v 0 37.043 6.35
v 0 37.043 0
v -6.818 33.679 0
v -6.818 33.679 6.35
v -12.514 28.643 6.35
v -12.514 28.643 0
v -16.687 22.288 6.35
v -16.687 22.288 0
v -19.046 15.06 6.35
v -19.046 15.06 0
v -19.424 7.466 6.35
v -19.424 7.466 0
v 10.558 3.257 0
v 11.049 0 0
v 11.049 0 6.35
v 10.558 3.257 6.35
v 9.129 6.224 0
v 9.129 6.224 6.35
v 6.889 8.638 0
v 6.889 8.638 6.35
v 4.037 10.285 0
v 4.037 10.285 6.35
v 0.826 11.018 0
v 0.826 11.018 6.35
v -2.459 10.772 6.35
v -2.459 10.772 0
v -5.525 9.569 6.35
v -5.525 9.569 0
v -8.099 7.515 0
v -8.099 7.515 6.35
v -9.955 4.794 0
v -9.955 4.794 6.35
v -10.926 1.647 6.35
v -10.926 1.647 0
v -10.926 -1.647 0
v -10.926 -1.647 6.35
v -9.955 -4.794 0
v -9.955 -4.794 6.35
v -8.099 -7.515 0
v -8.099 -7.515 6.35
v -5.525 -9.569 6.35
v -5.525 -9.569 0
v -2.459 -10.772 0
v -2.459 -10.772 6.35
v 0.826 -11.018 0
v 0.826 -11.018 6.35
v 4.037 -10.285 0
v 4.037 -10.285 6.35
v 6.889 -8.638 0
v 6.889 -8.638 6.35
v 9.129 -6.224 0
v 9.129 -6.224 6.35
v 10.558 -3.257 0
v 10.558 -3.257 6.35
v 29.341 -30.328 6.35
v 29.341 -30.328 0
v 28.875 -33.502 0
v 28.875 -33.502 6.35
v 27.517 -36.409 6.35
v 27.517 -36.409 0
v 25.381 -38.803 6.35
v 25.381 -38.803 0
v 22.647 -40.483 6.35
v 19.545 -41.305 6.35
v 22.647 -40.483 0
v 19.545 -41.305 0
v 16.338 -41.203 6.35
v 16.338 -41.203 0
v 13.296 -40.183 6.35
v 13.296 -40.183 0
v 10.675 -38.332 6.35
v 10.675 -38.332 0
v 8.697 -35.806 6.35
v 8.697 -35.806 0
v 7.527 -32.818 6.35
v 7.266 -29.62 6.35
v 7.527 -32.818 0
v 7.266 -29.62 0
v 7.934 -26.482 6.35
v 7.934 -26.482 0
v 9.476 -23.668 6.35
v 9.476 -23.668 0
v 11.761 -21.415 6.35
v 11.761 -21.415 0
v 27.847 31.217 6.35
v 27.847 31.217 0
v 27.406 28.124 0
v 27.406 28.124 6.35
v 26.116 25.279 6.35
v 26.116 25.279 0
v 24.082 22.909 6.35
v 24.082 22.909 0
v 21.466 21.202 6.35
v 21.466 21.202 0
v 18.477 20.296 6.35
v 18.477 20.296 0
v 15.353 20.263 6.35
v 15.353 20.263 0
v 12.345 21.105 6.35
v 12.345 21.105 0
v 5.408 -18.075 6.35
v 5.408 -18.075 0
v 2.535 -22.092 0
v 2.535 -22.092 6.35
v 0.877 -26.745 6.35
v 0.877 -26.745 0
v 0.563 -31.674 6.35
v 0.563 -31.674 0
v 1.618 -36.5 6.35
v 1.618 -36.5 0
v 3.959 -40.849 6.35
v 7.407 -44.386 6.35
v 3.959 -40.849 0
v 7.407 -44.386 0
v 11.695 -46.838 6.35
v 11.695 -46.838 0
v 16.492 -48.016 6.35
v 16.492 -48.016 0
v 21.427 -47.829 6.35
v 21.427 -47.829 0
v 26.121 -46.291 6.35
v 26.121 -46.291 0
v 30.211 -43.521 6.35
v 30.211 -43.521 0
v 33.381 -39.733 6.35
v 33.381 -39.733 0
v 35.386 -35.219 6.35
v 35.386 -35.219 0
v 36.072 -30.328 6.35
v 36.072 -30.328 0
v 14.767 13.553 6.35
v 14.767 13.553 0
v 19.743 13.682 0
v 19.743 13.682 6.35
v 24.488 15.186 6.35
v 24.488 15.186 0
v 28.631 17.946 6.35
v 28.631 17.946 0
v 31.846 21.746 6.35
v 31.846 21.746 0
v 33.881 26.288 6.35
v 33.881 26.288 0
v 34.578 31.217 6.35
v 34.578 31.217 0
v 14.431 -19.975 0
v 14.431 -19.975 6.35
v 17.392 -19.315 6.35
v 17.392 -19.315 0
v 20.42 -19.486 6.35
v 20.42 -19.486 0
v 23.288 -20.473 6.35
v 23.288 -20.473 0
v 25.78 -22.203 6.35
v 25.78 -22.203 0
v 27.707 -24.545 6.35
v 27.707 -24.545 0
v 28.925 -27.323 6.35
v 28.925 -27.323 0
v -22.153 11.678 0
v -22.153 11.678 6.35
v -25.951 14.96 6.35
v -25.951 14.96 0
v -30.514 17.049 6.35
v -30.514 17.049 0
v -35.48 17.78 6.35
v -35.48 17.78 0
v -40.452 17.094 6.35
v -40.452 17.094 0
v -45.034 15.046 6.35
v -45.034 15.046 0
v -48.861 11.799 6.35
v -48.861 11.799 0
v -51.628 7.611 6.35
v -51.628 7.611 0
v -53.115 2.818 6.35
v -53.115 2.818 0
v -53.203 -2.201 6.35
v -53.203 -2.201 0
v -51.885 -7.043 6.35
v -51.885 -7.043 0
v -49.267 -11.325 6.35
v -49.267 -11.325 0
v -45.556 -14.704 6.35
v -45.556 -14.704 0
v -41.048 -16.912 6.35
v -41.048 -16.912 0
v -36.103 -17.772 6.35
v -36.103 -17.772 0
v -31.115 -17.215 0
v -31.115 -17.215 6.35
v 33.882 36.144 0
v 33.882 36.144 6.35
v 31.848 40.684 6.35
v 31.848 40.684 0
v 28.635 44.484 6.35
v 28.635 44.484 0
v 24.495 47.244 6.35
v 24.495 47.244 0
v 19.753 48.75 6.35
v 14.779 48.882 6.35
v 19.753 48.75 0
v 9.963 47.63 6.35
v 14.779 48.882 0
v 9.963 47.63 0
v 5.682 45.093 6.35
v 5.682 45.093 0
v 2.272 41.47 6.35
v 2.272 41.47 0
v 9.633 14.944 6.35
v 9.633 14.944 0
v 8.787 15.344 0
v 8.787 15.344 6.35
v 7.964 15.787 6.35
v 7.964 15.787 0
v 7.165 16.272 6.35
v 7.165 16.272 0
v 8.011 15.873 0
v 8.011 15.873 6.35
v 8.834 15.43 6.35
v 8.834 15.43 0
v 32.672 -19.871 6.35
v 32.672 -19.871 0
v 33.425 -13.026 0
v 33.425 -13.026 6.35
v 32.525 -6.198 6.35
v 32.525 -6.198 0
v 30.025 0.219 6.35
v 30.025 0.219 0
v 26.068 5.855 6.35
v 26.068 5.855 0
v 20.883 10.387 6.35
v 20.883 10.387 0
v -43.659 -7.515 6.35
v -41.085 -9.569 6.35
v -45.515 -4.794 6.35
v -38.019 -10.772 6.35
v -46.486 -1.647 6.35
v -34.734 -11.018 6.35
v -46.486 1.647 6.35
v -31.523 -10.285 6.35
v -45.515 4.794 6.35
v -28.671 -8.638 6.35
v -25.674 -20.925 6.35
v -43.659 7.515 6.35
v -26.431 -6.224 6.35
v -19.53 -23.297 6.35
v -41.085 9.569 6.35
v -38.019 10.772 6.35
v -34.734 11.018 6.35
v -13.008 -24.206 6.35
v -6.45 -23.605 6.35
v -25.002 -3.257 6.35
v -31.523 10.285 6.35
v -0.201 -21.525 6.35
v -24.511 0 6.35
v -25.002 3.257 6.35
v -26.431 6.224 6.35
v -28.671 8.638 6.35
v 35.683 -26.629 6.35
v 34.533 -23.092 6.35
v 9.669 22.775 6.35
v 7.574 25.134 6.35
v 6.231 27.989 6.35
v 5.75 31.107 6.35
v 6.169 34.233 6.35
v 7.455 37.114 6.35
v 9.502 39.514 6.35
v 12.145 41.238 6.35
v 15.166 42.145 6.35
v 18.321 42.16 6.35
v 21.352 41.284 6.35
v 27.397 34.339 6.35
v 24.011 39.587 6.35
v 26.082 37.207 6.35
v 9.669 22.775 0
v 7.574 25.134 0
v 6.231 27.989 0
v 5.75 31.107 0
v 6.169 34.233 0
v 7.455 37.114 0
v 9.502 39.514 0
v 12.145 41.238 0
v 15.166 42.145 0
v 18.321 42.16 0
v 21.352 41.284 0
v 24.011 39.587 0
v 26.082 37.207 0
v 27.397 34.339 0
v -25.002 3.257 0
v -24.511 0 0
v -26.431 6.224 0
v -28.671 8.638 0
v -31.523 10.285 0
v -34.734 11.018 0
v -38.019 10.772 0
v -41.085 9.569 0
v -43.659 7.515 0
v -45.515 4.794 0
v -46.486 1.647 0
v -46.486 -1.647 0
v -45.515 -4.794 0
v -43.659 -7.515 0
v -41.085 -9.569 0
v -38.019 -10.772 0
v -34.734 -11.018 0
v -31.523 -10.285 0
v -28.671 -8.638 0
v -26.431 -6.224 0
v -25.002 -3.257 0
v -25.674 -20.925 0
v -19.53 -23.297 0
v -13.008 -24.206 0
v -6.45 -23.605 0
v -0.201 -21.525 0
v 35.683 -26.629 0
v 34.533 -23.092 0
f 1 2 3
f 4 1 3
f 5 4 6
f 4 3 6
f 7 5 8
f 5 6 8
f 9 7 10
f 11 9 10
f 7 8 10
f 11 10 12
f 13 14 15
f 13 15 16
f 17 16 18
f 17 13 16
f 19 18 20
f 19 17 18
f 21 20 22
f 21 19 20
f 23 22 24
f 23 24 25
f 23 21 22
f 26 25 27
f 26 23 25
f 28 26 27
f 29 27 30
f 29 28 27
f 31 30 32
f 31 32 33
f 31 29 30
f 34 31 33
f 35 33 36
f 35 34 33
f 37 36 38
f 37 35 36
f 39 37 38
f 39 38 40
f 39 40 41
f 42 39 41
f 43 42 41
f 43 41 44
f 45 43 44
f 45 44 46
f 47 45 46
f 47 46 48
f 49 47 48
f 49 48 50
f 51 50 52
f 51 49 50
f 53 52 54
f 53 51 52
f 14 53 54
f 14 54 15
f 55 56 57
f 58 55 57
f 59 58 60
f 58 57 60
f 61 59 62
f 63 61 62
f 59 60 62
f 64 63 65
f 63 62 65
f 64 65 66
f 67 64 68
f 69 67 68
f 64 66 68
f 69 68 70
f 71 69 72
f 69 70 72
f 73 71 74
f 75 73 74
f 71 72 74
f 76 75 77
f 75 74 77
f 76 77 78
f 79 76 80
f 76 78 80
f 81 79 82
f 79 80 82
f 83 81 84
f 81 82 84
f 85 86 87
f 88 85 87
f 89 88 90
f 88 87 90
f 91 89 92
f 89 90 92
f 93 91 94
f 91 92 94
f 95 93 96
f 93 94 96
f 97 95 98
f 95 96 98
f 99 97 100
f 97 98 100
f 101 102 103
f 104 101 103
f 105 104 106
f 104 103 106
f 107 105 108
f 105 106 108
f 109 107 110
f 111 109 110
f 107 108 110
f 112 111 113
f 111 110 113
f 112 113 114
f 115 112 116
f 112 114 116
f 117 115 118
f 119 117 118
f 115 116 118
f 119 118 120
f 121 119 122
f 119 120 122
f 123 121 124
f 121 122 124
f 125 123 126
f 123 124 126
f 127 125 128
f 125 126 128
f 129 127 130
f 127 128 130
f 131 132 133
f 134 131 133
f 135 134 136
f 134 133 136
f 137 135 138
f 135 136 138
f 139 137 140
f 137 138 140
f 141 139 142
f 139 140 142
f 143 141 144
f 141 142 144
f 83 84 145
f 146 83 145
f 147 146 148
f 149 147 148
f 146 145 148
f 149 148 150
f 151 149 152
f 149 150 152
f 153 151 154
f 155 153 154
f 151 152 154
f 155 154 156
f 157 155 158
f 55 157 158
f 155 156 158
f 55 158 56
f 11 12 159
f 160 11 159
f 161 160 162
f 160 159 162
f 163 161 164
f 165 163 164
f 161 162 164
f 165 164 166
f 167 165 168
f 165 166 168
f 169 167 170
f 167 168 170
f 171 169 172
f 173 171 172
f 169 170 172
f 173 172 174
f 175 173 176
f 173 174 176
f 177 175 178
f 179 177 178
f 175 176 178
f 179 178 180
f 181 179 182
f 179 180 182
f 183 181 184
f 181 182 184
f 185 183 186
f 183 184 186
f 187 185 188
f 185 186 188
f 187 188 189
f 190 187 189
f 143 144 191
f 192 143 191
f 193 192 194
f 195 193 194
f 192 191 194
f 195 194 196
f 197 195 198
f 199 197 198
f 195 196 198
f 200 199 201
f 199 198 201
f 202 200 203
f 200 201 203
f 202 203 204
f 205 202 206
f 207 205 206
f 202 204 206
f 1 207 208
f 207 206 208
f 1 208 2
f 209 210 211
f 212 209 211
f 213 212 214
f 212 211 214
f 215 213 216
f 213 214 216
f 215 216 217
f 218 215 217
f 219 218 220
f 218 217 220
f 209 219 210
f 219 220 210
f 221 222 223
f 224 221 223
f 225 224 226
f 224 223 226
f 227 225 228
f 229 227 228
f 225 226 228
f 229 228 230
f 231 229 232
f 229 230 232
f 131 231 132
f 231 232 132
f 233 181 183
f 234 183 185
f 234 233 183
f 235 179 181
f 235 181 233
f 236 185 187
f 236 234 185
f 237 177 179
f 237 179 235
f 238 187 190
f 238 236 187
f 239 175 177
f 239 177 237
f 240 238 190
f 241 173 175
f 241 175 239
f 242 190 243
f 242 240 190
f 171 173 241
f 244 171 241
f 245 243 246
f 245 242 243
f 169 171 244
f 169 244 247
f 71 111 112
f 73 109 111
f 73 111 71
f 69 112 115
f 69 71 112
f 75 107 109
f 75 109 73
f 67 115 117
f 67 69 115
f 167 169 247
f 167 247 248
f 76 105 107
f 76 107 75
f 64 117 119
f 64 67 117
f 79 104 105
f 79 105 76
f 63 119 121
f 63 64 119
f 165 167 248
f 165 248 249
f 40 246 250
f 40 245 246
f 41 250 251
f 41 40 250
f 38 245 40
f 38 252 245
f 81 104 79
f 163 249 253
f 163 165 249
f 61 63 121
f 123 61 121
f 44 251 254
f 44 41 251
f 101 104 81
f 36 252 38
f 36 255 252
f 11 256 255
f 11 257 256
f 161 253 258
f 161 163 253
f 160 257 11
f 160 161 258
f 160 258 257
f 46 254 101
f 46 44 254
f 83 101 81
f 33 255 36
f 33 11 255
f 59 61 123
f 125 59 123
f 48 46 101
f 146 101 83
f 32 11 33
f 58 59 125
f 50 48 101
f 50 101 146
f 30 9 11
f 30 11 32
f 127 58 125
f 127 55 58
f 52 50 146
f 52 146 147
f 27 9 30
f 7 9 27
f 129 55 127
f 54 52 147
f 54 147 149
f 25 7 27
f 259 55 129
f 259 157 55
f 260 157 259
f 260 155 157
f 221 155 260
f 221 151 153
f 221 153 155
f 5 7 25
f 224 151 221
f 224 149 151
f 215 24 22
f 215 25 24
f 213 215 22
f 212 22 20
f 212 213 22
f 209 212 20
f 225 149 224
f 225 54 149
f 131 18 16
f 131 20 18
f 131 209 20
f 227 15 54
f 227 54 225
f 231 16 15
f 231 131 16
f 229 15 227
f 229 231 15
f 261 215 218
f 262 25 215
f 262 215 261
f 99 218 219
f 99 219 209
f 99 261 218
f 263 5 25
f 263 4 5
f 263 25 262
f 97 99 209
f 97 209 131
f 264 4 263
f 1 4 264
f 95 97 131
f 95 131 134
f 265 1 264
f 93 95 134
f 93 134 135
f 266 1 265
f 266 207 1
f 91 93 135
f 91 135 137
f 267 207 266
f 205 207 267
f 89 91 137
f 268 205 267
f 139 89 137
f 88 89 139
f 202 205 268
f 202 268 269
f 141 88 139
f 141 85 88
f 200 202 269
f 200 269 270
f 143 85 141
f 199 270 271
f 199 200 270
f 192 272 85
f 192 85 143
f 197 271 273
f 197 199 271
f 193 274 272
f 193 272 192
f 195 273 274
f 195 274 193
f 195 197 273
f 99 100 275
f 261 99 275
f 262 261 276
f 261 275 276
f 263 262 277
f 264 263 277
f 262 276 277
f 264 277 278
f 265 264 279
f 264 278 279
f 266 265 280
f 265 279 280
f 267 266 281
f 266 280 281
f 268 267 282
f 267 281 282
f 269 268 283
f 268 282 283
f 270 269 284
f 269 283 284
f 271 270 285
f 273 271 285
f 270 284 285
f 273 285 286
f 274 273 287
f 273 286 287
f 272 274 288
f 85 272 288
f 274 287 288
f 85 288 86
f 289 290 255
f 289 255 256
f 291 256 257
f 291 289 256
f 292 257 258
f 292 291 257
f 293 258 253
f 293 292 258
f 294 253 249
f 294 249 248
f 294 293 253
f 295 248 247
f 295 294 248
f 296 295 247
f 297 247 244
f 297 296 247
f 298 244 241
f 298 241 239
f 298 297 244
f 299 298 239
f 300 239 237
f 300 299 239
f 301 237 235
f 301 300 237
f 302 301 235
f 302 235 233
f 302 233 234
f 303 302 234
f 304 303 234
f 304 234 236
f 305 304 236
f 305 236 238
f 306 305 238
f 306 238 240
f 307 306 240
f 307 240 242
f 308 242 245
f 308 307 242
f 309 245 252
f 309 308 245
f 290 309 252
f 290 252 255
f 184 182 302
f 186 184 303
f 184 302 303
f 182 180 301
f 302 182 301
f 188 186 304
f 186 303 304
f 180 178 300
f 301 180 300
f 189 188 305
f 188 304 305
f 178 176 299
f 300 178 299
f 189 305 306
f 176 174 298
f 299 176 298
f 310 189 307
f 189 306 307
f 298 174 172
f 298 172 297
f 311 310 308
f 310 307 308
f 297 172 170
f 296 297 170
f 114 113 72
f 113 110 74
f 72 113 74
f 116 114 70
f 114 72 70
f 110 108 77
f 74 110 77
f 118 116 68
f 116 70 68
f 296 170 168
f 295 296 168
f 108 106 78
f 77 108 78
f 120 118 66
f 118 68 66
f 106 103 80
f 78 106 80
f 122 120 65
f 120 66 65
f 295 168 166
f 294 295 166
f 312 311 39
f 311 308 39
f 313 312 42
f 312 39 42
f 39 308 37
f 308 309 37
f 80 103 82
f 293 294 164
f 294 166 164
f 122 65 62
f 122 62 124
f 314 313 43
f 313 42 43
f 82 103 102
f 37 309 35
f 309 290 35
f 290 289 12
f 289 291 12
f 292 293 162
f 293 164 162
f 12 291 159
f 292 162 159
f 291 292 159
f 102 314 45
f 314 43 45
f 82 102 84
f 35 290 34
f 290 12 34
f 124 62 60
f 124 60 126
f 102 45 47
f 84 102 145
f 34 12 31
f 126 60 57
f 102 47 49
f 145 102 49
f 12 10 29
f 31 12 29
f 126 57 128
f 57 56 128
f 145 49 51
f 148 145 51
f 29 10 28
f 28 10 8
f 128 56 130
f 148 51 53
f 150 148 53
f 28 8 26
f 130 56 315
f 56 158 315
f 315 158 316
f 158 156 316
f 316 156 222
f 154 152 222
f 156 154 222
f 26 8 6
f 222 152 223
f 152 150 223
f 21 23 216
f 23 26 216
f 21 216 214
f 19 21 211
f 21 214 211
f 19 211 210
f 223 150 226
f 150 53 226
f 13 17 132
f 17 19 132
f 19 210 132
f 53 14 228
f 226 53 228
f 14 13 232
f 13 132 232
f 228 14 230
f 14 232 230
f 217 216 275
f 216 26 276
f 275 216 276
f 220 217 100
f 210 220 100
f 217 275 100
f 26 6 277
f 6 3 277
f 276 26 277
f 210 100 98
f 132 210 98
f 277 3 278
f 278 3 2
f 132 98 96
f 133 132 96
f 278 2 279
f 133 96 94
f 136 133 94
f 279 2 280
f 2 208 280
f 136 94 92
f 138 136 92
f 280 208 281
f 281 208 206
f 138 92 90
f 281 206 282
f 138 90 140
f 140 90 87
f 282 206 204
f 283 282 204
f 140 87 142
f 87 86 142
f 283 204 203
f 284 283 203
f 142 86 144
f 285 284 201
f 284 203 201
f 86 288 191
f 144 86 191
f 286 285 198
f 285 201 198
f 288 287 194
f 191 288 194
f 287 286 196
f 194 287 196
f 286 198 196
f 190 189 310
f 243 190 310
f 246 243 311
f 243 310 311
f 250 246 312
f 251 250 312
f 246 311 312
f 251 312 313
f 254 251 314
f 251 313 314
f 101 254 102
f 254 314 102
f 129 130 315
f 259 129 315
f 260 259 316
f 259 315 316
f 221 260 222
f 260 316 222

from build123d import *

# Parameters (mm, degrees)
F0_R     = 11.049
F1_DEPTH = 6.35


with BuildPart() as f1:
    # F0 (on Top) → F1 (new body)
    with BuildSketch(Plane.XY):
        with BuildLine():
            ThreePointArc((10.5094277958, -14.3415594481), (15.8585312405, -8.0396136036), (17.78, 0))
            ThreePointArc((17.78, 0), (15.6108797336, 8.5105131421), (9.6327745846, 14.9444991151))
            ThreePointArc((9.6327745846, 14.9444991151), (8.3729133787, 15.5596772314), (7.1654409141, 16.2722111745))
            ThreePointArc((7.1654409141, 16.2722111745), (-9.7140841192, 14.8917752376), (-17.78, 0))
            ThreePointArc((-17.78, 0), (-9.4273906442, -15.0749031719), (7.7827340428, -15.986164356))
            ThreePointArc((7.7827340428, -15.986164356), (9.1091896886, -15.102697614), (10.5094277958, -14.3415594481))
        make_face()
        Circle(F0_R, mode=Mode.SUBTRACT)
        with BuildLine():
            ThreePointArc((9.6327745846, 14.9444991151), (15.6108797336, 8.5105131421), (17.78, 0))
            ThreePointArc((17.78, 0), (15.8585312405, -8.0396136036), (10.5094277958, -14.3415594481))
            ThreePointArc((10.5094277958, -14.3415594481), (22.5963149024, -13.0765595999), (32.6723306155, -19.8711877644))
            ThreePointArc((32.6723306155, -19.8711877644), (30.024905988, 0.2187336146), (14.766870478, 13.5531308843))
            ThreePointArc((14.766870478, 13.5531308843), (12.1474957403, 14.0557311296), (9.6327745846, 14.9444991151))
        make_face()
        with BuildLine():
            ThreePointArc((14.766870478, 13.5531308843), (12.2321244934, 14.3680080122), (9.6327745846, 14.9444991151))
            ThreePointArc((9.6327745846, 14.9444991151), (12.1474957403, 14.0557311296), (14.766870478, 13.5531308843))
        make_face()
        with BuildLine():
            ThreePointArc((7.1654409141, 16.2722111745), (8.42530212, 15.6570330582), (9.6327745846, 14.9444991151))
            ThreePointArc((9.6327745846, 14.9444991151), (12.2321244934, 14.3680080122), (14.766870478, 13.5531308843))
            ThreePointArc((14.766870478, 13.5531308843), (28.6306092872, 17.9455815797), (34.5782154987, 31.2167102896))
            ThreePointArc((34.5782154987, 31.2167102896), (19.7525452394, 48.7495462206), (0, 37.0432320702))
            ThreePointArc((0, 37.0432320702), (-0.0097628586, 25.4184119581), (7.1654409141, 16.2722111745))
        make_face()
        with BuildLine():
            ThreePointArc((27.8472154987, 31.2167102896), (22.8348249156, 21.9625356777), (12.3454057878, 21.1046933455))
            ThreePointArc((12.3454057878, 21.1046933455), (10.7616060818, 40.4708849015), (27.8472154987, 31.2167102896))
        make_face(mode=Mode.SUBTRACT)
        with BuildLine():
            ThreePointArc((32.6723306155, -19.8711877644), (22.5963149024, -13.0765595999), (10.5094277958, -14.3415594481))
            ThreePointArc((10.5094277958, -14.3415594481), (9.1829721501, -15.2250261902), (7.7827340428, -15.986164356))
            ThreePointArc((7.7827340428, -15.986164356), (6.6242894769, -17.0632176818), (5.4082696447, -18.0748171313))
            ThreePointArc((5.4082696447, -18.0748171313), (11.6947079059, -46.8383870739), (36.0721618387, -30.3277238042))
            ThreePointArc((36.0721618387, -30.3277238042), (35.2008548818, -24.8300425135), (32.6723306155, -19.8711877644))
        make_face()
        with BuildLine():
            ThreePointArc((29.3411618387, -30.3277238042), (13.2961162421, -40.1826682179), (11.761303137, -21.4154690043))
            ThreePointArc((11.761303137, -21.4154690043), (23.2882074352, -20.4727793905), (29.3411618387, -30.3277238042))
        make_face(mode=Mode.SUBTRACT)
        with BuildLine():
            ThreePointArc((7.7827340428, -15.986164356), (9.1829721501, -15.2250261902), (10.5094277958, -14.3415594481))
            ThreePointArc((10.5094277958, -14.3415594481), (9.1091896886, -15.102697614), (7.7827340428, -15.986164356))
        make_face()
        with BuildLine():
            ThreePointArc((-17.78, 0), (-9.7140841192, 14.8917752376), (7.1654409141, 16.2722111745))
            ThreePointArc((7.1654409141, 16.2722111745), (-0.0097628586, 25.4184119581), (0, 37.0432320702))
            ThreePointArc((0, 37.0432320702), (-14.8117955692, 25.6039367366), (-19.4235623734, 7.4661757763))
            ThreePointArc((-19.4235623734, 7.4661757763), (-18.1957513695, 3.8224690318), (-17.78, 0))
        make_face()
        with BuildLine():
            ThreePointArc((5.4082696447, -18.0748171313), (6.5489734879, -16.9775954393), (7.7827340428, -15.986164356))
            ThreePointArc((7.7827340428, -15.986164356), (-9.4273906442, -15.0749031719), (-17.78, 0))
            ThreePointArc((-17.78, 0), (-21.5036758006, -10.8879819067), (-31.115, -17.2154109739))
            ThreePointArc((-31.115, -17.2154109739), (-13.0077535924, -24.206353637), (5.4082696447, -18.0748171313))
        make_face()
        with BuildLine():
            ThreePointArc((5.4082696447, -18.0748171313), (6.6242894769, -17.0632176818), (7.7827340428, -15.986164356))
            ThreePointArc((7.7827340428, -15.986164356), (6.5489734879, -16.9775954393), (5.4082696447, -18.0748171313))
        make_face()
        with BuildLine():
            ThreePointArc((-19.4235623734, 7.4661757763), (-18.851475509, 3.67812157), (-17.78, 0))
            ThreePointArc((-17.78, 0), (-18.1957513695, 3.8224690318), (-19.4235623734, 7.4661757763))
        make_face()
        with BuildLine():
            ThreePointArc((-31.115, -17.2154109739), (-21.5036758006, -10.8879819067), (-17.78, 0))
            ThreePointArc((-17.78, 0), (-18.851475509, 3.67812157), (-19.4235623734, 7.4661757763))
            ThreePointArc((-19.4235623734, 7.4661757763), (-51.6284185538, 7.6114601214), (-31.115, -17.2154109739))
        make_face()
        with Locations((-35.56, 0)):
            Circle(F0_R, mode=Mode.SUBTRACT)
    extrude(amount=F1_DEPTH)


solid = f1.part
